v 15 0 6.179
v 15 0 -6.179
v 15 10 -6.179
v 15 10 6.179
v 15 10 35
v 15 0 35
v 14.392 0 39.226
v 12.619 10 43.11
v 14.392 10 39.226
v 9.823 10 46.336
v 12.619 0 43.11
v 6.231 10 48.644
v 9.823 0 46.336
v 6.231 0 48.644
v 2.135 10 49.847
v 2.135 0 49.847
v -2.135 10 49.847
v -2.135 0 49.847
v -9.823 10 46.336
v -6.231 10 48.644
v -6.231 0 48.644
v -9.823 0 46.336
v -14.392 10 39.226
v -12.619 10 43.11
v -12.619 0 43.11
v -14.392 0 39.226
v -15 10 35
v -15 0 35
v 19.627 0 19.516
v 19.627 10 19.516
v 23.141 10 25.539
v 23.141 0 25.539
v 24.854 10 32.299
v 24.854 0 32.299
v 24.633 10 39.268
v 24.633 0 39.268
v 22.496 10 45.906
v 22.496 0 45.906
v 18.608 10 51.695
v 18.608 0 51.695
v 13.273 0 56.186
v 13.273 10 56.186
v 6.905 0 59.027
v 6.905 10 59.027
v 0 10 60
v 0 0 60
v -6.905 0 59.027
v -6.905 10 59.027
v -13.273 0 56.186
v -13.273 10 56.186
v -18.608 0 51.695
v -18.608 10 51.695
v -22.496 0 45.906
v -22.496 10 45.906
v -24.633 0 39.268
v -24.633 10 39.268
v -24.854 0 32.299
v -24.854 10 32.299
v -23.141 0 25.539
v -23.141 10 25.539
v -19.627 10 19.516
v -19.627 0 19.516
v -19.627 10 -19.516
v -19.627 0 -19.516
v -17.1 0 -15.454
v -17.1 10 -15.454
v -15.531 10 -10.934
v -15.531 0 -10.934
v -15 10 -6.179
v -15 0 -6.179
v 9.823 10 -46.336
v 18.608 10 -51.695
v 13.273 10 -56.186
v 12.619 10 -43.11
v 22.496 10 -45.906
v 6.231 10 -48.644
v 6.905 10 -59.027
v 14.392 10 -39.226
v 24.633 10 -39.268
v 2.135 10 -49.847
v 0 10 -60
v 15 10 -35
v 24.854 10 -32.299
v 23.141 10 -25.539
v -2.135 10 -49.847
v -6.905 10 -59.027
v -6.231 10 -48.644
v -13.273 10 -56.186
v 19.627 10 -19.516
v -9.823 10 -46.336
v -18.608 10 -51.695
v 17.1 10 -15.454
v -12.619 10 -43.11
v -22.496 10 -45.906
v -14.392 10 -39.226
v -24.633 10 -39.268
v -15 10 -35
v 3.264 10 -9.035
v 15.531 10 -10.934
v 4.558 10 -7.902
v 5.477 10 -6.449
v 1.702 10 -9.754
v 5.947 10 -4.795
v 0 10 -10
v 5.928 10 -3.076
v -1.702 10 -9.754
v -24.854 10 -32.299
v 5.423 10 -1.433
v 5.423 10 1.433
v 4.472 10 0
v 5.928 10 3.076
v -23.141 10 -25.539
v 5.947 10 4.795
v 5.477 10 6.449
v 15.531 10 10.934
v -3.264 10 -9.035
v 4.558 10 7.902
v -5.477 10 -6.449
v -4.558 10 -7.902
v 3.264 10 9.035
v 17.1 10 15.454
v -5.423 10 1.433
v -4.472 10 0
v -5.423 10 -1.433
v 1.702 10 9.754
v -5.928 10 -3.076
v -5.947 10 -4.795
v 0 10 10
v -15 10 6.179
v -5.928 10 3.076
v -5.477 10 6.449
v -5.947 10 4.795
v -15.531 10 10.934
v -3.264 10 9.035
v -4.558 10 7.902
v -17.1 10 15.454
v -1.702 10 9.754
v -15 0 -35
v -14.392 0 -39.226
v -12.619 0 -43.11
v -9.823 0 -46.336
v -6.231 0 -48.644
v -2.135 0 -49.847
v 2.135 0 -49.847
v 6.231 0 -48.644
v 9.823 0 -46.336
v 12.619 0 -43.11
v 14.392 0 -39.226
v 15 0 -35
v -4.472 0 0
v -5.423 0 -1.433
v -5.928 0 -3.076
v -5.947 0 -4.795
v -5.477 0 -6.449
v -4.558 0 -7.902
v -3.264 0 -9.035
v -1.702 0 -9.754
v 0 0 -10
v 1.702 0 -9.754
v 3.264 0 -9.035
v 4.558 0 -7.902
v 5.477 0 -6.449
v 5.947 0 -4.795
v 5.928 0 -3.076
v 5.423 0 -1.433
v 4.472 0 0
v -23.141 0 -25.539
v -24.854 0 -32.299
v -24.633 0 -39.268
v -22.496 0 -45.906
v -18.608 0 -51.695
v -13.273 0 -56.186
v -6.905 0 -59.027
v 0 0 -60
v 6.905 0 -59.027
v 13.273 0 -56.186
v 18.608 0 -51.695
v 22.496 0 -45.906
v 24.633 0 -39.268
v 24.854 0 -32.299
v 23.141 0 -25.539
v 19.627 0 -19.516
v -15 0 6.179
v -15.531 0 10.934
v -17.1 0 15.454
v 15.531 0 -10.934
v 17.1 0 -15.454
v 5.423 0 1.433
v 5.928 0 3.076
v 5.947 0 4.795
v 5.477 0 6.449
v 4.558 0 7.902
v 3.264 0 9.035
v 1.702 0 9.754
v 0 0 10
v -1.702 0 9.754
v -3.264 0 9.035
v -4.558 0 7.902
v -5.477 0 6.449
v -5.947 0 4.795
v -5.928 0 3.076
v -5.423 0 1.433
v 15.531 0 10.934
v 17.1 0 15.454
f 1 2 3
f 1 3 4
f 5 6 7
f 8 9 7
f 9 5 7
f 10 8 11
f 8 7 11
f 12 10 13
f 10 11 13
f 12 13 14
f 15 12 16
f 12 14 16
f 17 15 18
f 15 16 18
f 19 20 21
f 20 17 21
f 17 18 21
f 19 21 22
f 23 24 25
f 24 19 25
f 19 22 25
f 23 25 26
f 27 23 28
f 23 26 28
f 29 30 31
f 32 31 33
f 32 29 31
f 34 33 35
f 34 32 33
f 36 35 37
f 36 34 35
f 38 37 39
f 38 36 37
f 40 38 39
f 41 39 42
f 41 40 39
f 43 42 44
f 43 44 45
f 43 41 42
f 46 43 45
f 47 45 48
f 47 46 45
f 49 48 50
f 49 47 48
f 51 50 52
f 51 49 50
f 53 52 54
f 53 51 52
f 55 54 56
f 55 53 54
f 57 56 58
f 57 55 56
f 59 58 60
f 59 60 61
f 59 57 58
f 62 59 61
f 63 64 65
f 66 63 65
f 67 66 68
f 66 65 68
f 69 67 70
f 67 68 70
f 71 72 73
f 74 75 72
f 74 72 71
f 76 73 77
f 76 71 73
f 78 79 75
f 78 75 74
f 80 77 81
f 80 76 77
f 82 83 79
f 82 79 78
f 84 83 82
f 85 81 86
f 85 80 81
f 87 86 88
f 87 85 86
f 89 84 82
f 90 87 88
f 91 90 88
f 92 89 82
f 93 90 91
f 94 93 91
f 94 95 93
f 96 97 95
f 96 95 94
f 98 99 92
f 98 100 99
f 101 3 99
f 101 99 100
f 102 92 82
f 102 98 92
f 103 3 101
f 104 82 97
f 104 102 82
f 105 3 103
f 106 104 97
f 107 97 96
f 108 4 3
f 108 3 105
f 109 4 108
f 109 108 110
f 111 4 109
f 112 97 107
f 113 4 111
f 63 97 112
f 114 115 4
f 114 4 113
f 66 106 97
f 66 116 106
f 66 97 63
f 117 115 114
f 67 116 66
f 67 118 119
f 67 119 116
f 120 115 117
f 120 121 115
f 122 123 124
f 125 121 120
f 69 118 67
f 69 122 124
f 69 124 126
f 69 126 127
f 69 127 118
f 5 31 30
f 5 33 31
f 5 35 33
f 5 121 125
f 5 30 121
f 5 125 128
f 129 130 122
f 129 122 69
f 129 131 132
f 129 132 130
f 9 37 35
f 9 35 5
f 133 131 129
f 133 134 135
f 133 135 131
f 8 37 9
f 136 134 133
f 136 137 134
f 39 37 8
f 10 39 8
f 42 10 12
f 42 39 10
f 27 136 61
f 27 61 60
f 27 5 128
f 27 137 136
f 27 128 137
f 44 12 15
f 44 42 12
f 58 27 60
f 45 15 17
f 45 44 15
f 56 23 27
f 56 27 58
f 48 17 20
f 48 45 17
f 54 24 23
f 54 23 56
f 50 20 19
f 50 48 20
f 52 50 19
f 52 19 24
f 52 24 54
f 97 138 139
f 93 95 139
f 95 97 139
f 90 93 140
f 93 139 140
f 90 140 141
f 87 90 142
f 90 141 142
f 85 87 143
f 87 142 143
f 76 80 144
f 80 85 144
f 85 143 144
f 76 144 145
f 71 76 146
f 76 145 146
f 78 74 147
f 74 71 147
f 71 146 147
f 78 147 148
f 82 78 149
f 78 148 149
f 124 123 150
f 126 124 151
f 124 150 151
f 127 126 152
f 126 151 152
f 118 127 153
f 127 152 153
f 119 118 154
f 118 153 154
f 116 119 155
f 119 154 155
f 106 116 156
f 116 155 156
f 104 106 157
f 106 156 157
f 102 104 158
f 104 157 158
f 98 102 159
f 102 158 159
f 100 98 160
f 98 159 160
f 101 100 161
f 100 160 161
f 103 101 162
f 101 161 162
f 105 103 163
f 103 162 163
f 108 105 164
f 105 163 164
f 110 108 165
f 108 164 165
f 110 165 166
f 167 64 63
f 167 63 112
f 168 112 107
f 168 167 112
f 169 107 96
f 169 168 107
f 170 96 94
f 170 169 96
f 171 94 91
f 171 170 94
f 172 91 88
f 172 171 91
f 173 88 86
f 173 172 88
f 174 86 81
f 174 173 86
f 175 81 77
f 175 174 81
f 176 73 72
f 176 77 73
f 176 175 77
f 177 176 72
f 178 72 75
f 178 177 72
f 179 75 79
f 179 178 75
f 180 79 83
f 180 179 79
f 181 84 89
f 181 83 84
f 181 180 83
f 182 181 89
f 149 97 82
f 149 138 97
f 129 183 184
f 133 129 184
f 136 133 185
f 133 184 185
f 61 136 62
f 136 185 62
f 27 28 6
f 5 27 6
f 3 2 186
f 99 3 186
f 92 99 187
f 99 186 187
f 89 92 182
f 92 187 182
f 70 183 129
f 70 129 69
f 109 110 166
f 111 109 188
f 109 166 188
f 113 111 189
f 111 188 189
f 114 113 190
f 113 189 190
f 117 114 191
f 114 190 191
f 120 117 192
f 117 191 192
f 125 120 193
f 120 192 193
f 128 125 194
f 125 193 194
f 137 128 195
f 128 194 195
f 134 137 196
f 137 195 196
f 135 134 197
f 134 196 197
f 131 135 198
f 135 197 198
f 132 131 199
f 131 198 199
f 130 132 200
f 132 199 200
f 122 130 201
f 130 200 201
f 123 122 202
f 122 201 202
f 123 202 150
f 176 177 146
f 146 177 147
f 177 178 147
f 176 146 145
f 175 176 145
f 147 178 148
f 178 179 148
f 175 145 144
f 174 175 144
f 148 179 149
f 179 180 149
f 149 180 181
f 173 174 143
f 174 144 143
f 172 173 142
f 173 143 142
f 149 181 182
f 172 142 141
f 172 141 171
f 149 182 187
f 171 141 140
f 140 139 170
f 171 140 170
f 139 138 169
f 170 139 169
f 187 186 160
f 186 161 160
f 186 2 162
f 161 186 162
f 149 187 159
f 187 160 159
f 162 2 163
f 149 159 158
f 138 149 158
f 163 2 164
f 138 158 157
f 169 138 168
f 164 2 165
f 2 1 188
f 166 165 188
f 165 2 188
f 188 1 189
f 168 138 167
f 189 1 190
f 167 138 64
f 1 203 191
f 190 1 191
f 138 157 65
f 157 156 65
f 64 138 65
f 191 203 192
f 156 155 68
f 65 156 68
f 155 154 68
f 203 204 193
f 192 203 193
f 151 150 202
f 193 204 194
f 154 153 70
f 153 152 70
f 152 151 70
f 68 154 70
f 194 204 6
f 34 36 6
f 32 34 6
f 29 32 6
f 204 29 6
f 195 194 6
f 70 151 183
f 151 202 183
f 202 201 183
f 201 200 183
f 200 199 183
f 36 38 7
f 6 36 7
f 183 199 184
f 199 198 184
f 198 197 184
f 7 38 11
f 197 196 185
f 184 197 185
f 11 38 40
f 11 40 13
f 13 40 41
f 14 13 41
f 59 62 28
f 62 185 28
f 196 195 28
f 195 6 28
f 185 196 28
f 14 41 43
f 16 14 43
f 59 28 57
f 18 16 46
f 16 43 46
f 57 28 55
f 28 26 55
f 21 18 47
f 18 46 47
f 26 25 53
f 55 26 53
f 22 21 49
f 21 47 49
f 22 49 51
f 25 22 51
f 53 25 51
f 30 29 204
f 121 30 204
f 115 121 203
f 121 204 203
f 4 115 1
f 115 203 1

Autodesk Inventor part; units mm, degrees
ref_plane "YZ Plane" through (0, 0, 0) normal (1, 0, 0) x (0, 1, 0)
ref_plane "XZ Plane" through (0, 0, 0) normal (0, 1, 0) x (-1, 0, 0)
ref_plane "XY Plane" through (0, 0, 0) normal (0, 0, 1) x (1, 0, 0)
sketch "Boceto1" plane through (0, 0, 0) normal (0, 1, 0) x (-1, 0, 0)
  line L0 (0, 35) -> (0, -35) construction
  arc A0 (25, 35) -> (-25, 35) centre (0, 35) ccw
  arc A1 (-25, -35) -> (25, -35) centre (0, -35) ccw
  circle A2 centre (0, -35) radius 15
  circle A3 centre (0, 35) radius 15
  line L1 (0, -20) -> (0, -20)
  line L2 (15, -35) -> (-15, -35)
  line L3 (94.5074, 0) -> (-76.0102, 0) construction
  line L4 (15, 35) -> (-15, 35)
  line L5 (15, -35) -> (-15, -35)
  line L6 (15, -6.1794) -> (-15, -6.1794)
  line L7 (-15, -6.1794) -> (-15, 6.1794)
  line L8 (-15, 6.1794) -> (15, 6.1794)
  line L9 (15, 6.1794) -> (15, -6.1794)
  line L10 (15, -6.1794) -> (-15, 6.1794) construction
  line L11 (-15, -6.1794) -> (15, 6.1794) construction
  circle A4 centre (0, -35) radius 25
  arc A5 (15, -6.1794) -> (19.6273, -19.5155) centre (36.5312, -6.1794) ccw
  line L12 (0, -66.9543) -> (0, 90.1933) construction
  arc A6 (-19.6273, -19.5155) -> (-15, -6.1794) centre (-36.5312, -6.1794) ccw
  circle A7 centre (0, 35) radius 25
  arc A8 (19.6273, 19.5155) -> (15, 6.1794) centre (36.5312, 6.1794) ccw
  arc A9 (-15, 6.1794) -> (-19.6273, 19.5155) centre (-36.5312, 6.1794) ccw
  circle A10 centre (0, 4) radius 6
  circle A11 centre (0, -4) radius 6
  point P0 (0, 0)
  point P1 (0, 60)
  point P2 (0, -60)
  point P3 (0, -20)
  point P4 (15, 35)
  point P5 (0, 0)
  point P6 (15, 6.1794)
  point P7 (25, 35)
  point P8 (-25, 35)
  point P9 (-19.6273, 19.5155)
  point P10 (-15, 6.1794)
  point P11 (-12.5, -0.1825)
  point P12 (-19.6273, -19.5155)
  point P13 (25, -35)
  point P14 (-15, 6.1794)
  point P15 (4.4721, 0)
  point P16 (-4.4721, 0)
  dimension "largo" = 120
  dimension "espesor_junta" = 10
  dimension "d3" = 10
  dimension "d6" = 0
  dimension "d29" = 30
  dimension "d35" = 12
  dimension "d36" = 12
  dimension "d37" = 8
  dimension "d38" = 4
extrude "Extrusión8" add sketch "Boceto1" along normal blind 10 contours A7 A0 | A8 L8 A10 A7 | A7 A10 L8 A9 | L9 L6 A11 A10 L8 | L8 A10 A11 L6 L7 | A5 A4 A11 L6 | L6 A11 A4 A6 | A4 A1 | L2 A2 | A3 L4 picked at (1.773, -30.3249) picked at (0.6027, 30.0365)
equation "\"d3\" = espesor_junta"
properties part number "mod5" material "Aluminio 6061"
